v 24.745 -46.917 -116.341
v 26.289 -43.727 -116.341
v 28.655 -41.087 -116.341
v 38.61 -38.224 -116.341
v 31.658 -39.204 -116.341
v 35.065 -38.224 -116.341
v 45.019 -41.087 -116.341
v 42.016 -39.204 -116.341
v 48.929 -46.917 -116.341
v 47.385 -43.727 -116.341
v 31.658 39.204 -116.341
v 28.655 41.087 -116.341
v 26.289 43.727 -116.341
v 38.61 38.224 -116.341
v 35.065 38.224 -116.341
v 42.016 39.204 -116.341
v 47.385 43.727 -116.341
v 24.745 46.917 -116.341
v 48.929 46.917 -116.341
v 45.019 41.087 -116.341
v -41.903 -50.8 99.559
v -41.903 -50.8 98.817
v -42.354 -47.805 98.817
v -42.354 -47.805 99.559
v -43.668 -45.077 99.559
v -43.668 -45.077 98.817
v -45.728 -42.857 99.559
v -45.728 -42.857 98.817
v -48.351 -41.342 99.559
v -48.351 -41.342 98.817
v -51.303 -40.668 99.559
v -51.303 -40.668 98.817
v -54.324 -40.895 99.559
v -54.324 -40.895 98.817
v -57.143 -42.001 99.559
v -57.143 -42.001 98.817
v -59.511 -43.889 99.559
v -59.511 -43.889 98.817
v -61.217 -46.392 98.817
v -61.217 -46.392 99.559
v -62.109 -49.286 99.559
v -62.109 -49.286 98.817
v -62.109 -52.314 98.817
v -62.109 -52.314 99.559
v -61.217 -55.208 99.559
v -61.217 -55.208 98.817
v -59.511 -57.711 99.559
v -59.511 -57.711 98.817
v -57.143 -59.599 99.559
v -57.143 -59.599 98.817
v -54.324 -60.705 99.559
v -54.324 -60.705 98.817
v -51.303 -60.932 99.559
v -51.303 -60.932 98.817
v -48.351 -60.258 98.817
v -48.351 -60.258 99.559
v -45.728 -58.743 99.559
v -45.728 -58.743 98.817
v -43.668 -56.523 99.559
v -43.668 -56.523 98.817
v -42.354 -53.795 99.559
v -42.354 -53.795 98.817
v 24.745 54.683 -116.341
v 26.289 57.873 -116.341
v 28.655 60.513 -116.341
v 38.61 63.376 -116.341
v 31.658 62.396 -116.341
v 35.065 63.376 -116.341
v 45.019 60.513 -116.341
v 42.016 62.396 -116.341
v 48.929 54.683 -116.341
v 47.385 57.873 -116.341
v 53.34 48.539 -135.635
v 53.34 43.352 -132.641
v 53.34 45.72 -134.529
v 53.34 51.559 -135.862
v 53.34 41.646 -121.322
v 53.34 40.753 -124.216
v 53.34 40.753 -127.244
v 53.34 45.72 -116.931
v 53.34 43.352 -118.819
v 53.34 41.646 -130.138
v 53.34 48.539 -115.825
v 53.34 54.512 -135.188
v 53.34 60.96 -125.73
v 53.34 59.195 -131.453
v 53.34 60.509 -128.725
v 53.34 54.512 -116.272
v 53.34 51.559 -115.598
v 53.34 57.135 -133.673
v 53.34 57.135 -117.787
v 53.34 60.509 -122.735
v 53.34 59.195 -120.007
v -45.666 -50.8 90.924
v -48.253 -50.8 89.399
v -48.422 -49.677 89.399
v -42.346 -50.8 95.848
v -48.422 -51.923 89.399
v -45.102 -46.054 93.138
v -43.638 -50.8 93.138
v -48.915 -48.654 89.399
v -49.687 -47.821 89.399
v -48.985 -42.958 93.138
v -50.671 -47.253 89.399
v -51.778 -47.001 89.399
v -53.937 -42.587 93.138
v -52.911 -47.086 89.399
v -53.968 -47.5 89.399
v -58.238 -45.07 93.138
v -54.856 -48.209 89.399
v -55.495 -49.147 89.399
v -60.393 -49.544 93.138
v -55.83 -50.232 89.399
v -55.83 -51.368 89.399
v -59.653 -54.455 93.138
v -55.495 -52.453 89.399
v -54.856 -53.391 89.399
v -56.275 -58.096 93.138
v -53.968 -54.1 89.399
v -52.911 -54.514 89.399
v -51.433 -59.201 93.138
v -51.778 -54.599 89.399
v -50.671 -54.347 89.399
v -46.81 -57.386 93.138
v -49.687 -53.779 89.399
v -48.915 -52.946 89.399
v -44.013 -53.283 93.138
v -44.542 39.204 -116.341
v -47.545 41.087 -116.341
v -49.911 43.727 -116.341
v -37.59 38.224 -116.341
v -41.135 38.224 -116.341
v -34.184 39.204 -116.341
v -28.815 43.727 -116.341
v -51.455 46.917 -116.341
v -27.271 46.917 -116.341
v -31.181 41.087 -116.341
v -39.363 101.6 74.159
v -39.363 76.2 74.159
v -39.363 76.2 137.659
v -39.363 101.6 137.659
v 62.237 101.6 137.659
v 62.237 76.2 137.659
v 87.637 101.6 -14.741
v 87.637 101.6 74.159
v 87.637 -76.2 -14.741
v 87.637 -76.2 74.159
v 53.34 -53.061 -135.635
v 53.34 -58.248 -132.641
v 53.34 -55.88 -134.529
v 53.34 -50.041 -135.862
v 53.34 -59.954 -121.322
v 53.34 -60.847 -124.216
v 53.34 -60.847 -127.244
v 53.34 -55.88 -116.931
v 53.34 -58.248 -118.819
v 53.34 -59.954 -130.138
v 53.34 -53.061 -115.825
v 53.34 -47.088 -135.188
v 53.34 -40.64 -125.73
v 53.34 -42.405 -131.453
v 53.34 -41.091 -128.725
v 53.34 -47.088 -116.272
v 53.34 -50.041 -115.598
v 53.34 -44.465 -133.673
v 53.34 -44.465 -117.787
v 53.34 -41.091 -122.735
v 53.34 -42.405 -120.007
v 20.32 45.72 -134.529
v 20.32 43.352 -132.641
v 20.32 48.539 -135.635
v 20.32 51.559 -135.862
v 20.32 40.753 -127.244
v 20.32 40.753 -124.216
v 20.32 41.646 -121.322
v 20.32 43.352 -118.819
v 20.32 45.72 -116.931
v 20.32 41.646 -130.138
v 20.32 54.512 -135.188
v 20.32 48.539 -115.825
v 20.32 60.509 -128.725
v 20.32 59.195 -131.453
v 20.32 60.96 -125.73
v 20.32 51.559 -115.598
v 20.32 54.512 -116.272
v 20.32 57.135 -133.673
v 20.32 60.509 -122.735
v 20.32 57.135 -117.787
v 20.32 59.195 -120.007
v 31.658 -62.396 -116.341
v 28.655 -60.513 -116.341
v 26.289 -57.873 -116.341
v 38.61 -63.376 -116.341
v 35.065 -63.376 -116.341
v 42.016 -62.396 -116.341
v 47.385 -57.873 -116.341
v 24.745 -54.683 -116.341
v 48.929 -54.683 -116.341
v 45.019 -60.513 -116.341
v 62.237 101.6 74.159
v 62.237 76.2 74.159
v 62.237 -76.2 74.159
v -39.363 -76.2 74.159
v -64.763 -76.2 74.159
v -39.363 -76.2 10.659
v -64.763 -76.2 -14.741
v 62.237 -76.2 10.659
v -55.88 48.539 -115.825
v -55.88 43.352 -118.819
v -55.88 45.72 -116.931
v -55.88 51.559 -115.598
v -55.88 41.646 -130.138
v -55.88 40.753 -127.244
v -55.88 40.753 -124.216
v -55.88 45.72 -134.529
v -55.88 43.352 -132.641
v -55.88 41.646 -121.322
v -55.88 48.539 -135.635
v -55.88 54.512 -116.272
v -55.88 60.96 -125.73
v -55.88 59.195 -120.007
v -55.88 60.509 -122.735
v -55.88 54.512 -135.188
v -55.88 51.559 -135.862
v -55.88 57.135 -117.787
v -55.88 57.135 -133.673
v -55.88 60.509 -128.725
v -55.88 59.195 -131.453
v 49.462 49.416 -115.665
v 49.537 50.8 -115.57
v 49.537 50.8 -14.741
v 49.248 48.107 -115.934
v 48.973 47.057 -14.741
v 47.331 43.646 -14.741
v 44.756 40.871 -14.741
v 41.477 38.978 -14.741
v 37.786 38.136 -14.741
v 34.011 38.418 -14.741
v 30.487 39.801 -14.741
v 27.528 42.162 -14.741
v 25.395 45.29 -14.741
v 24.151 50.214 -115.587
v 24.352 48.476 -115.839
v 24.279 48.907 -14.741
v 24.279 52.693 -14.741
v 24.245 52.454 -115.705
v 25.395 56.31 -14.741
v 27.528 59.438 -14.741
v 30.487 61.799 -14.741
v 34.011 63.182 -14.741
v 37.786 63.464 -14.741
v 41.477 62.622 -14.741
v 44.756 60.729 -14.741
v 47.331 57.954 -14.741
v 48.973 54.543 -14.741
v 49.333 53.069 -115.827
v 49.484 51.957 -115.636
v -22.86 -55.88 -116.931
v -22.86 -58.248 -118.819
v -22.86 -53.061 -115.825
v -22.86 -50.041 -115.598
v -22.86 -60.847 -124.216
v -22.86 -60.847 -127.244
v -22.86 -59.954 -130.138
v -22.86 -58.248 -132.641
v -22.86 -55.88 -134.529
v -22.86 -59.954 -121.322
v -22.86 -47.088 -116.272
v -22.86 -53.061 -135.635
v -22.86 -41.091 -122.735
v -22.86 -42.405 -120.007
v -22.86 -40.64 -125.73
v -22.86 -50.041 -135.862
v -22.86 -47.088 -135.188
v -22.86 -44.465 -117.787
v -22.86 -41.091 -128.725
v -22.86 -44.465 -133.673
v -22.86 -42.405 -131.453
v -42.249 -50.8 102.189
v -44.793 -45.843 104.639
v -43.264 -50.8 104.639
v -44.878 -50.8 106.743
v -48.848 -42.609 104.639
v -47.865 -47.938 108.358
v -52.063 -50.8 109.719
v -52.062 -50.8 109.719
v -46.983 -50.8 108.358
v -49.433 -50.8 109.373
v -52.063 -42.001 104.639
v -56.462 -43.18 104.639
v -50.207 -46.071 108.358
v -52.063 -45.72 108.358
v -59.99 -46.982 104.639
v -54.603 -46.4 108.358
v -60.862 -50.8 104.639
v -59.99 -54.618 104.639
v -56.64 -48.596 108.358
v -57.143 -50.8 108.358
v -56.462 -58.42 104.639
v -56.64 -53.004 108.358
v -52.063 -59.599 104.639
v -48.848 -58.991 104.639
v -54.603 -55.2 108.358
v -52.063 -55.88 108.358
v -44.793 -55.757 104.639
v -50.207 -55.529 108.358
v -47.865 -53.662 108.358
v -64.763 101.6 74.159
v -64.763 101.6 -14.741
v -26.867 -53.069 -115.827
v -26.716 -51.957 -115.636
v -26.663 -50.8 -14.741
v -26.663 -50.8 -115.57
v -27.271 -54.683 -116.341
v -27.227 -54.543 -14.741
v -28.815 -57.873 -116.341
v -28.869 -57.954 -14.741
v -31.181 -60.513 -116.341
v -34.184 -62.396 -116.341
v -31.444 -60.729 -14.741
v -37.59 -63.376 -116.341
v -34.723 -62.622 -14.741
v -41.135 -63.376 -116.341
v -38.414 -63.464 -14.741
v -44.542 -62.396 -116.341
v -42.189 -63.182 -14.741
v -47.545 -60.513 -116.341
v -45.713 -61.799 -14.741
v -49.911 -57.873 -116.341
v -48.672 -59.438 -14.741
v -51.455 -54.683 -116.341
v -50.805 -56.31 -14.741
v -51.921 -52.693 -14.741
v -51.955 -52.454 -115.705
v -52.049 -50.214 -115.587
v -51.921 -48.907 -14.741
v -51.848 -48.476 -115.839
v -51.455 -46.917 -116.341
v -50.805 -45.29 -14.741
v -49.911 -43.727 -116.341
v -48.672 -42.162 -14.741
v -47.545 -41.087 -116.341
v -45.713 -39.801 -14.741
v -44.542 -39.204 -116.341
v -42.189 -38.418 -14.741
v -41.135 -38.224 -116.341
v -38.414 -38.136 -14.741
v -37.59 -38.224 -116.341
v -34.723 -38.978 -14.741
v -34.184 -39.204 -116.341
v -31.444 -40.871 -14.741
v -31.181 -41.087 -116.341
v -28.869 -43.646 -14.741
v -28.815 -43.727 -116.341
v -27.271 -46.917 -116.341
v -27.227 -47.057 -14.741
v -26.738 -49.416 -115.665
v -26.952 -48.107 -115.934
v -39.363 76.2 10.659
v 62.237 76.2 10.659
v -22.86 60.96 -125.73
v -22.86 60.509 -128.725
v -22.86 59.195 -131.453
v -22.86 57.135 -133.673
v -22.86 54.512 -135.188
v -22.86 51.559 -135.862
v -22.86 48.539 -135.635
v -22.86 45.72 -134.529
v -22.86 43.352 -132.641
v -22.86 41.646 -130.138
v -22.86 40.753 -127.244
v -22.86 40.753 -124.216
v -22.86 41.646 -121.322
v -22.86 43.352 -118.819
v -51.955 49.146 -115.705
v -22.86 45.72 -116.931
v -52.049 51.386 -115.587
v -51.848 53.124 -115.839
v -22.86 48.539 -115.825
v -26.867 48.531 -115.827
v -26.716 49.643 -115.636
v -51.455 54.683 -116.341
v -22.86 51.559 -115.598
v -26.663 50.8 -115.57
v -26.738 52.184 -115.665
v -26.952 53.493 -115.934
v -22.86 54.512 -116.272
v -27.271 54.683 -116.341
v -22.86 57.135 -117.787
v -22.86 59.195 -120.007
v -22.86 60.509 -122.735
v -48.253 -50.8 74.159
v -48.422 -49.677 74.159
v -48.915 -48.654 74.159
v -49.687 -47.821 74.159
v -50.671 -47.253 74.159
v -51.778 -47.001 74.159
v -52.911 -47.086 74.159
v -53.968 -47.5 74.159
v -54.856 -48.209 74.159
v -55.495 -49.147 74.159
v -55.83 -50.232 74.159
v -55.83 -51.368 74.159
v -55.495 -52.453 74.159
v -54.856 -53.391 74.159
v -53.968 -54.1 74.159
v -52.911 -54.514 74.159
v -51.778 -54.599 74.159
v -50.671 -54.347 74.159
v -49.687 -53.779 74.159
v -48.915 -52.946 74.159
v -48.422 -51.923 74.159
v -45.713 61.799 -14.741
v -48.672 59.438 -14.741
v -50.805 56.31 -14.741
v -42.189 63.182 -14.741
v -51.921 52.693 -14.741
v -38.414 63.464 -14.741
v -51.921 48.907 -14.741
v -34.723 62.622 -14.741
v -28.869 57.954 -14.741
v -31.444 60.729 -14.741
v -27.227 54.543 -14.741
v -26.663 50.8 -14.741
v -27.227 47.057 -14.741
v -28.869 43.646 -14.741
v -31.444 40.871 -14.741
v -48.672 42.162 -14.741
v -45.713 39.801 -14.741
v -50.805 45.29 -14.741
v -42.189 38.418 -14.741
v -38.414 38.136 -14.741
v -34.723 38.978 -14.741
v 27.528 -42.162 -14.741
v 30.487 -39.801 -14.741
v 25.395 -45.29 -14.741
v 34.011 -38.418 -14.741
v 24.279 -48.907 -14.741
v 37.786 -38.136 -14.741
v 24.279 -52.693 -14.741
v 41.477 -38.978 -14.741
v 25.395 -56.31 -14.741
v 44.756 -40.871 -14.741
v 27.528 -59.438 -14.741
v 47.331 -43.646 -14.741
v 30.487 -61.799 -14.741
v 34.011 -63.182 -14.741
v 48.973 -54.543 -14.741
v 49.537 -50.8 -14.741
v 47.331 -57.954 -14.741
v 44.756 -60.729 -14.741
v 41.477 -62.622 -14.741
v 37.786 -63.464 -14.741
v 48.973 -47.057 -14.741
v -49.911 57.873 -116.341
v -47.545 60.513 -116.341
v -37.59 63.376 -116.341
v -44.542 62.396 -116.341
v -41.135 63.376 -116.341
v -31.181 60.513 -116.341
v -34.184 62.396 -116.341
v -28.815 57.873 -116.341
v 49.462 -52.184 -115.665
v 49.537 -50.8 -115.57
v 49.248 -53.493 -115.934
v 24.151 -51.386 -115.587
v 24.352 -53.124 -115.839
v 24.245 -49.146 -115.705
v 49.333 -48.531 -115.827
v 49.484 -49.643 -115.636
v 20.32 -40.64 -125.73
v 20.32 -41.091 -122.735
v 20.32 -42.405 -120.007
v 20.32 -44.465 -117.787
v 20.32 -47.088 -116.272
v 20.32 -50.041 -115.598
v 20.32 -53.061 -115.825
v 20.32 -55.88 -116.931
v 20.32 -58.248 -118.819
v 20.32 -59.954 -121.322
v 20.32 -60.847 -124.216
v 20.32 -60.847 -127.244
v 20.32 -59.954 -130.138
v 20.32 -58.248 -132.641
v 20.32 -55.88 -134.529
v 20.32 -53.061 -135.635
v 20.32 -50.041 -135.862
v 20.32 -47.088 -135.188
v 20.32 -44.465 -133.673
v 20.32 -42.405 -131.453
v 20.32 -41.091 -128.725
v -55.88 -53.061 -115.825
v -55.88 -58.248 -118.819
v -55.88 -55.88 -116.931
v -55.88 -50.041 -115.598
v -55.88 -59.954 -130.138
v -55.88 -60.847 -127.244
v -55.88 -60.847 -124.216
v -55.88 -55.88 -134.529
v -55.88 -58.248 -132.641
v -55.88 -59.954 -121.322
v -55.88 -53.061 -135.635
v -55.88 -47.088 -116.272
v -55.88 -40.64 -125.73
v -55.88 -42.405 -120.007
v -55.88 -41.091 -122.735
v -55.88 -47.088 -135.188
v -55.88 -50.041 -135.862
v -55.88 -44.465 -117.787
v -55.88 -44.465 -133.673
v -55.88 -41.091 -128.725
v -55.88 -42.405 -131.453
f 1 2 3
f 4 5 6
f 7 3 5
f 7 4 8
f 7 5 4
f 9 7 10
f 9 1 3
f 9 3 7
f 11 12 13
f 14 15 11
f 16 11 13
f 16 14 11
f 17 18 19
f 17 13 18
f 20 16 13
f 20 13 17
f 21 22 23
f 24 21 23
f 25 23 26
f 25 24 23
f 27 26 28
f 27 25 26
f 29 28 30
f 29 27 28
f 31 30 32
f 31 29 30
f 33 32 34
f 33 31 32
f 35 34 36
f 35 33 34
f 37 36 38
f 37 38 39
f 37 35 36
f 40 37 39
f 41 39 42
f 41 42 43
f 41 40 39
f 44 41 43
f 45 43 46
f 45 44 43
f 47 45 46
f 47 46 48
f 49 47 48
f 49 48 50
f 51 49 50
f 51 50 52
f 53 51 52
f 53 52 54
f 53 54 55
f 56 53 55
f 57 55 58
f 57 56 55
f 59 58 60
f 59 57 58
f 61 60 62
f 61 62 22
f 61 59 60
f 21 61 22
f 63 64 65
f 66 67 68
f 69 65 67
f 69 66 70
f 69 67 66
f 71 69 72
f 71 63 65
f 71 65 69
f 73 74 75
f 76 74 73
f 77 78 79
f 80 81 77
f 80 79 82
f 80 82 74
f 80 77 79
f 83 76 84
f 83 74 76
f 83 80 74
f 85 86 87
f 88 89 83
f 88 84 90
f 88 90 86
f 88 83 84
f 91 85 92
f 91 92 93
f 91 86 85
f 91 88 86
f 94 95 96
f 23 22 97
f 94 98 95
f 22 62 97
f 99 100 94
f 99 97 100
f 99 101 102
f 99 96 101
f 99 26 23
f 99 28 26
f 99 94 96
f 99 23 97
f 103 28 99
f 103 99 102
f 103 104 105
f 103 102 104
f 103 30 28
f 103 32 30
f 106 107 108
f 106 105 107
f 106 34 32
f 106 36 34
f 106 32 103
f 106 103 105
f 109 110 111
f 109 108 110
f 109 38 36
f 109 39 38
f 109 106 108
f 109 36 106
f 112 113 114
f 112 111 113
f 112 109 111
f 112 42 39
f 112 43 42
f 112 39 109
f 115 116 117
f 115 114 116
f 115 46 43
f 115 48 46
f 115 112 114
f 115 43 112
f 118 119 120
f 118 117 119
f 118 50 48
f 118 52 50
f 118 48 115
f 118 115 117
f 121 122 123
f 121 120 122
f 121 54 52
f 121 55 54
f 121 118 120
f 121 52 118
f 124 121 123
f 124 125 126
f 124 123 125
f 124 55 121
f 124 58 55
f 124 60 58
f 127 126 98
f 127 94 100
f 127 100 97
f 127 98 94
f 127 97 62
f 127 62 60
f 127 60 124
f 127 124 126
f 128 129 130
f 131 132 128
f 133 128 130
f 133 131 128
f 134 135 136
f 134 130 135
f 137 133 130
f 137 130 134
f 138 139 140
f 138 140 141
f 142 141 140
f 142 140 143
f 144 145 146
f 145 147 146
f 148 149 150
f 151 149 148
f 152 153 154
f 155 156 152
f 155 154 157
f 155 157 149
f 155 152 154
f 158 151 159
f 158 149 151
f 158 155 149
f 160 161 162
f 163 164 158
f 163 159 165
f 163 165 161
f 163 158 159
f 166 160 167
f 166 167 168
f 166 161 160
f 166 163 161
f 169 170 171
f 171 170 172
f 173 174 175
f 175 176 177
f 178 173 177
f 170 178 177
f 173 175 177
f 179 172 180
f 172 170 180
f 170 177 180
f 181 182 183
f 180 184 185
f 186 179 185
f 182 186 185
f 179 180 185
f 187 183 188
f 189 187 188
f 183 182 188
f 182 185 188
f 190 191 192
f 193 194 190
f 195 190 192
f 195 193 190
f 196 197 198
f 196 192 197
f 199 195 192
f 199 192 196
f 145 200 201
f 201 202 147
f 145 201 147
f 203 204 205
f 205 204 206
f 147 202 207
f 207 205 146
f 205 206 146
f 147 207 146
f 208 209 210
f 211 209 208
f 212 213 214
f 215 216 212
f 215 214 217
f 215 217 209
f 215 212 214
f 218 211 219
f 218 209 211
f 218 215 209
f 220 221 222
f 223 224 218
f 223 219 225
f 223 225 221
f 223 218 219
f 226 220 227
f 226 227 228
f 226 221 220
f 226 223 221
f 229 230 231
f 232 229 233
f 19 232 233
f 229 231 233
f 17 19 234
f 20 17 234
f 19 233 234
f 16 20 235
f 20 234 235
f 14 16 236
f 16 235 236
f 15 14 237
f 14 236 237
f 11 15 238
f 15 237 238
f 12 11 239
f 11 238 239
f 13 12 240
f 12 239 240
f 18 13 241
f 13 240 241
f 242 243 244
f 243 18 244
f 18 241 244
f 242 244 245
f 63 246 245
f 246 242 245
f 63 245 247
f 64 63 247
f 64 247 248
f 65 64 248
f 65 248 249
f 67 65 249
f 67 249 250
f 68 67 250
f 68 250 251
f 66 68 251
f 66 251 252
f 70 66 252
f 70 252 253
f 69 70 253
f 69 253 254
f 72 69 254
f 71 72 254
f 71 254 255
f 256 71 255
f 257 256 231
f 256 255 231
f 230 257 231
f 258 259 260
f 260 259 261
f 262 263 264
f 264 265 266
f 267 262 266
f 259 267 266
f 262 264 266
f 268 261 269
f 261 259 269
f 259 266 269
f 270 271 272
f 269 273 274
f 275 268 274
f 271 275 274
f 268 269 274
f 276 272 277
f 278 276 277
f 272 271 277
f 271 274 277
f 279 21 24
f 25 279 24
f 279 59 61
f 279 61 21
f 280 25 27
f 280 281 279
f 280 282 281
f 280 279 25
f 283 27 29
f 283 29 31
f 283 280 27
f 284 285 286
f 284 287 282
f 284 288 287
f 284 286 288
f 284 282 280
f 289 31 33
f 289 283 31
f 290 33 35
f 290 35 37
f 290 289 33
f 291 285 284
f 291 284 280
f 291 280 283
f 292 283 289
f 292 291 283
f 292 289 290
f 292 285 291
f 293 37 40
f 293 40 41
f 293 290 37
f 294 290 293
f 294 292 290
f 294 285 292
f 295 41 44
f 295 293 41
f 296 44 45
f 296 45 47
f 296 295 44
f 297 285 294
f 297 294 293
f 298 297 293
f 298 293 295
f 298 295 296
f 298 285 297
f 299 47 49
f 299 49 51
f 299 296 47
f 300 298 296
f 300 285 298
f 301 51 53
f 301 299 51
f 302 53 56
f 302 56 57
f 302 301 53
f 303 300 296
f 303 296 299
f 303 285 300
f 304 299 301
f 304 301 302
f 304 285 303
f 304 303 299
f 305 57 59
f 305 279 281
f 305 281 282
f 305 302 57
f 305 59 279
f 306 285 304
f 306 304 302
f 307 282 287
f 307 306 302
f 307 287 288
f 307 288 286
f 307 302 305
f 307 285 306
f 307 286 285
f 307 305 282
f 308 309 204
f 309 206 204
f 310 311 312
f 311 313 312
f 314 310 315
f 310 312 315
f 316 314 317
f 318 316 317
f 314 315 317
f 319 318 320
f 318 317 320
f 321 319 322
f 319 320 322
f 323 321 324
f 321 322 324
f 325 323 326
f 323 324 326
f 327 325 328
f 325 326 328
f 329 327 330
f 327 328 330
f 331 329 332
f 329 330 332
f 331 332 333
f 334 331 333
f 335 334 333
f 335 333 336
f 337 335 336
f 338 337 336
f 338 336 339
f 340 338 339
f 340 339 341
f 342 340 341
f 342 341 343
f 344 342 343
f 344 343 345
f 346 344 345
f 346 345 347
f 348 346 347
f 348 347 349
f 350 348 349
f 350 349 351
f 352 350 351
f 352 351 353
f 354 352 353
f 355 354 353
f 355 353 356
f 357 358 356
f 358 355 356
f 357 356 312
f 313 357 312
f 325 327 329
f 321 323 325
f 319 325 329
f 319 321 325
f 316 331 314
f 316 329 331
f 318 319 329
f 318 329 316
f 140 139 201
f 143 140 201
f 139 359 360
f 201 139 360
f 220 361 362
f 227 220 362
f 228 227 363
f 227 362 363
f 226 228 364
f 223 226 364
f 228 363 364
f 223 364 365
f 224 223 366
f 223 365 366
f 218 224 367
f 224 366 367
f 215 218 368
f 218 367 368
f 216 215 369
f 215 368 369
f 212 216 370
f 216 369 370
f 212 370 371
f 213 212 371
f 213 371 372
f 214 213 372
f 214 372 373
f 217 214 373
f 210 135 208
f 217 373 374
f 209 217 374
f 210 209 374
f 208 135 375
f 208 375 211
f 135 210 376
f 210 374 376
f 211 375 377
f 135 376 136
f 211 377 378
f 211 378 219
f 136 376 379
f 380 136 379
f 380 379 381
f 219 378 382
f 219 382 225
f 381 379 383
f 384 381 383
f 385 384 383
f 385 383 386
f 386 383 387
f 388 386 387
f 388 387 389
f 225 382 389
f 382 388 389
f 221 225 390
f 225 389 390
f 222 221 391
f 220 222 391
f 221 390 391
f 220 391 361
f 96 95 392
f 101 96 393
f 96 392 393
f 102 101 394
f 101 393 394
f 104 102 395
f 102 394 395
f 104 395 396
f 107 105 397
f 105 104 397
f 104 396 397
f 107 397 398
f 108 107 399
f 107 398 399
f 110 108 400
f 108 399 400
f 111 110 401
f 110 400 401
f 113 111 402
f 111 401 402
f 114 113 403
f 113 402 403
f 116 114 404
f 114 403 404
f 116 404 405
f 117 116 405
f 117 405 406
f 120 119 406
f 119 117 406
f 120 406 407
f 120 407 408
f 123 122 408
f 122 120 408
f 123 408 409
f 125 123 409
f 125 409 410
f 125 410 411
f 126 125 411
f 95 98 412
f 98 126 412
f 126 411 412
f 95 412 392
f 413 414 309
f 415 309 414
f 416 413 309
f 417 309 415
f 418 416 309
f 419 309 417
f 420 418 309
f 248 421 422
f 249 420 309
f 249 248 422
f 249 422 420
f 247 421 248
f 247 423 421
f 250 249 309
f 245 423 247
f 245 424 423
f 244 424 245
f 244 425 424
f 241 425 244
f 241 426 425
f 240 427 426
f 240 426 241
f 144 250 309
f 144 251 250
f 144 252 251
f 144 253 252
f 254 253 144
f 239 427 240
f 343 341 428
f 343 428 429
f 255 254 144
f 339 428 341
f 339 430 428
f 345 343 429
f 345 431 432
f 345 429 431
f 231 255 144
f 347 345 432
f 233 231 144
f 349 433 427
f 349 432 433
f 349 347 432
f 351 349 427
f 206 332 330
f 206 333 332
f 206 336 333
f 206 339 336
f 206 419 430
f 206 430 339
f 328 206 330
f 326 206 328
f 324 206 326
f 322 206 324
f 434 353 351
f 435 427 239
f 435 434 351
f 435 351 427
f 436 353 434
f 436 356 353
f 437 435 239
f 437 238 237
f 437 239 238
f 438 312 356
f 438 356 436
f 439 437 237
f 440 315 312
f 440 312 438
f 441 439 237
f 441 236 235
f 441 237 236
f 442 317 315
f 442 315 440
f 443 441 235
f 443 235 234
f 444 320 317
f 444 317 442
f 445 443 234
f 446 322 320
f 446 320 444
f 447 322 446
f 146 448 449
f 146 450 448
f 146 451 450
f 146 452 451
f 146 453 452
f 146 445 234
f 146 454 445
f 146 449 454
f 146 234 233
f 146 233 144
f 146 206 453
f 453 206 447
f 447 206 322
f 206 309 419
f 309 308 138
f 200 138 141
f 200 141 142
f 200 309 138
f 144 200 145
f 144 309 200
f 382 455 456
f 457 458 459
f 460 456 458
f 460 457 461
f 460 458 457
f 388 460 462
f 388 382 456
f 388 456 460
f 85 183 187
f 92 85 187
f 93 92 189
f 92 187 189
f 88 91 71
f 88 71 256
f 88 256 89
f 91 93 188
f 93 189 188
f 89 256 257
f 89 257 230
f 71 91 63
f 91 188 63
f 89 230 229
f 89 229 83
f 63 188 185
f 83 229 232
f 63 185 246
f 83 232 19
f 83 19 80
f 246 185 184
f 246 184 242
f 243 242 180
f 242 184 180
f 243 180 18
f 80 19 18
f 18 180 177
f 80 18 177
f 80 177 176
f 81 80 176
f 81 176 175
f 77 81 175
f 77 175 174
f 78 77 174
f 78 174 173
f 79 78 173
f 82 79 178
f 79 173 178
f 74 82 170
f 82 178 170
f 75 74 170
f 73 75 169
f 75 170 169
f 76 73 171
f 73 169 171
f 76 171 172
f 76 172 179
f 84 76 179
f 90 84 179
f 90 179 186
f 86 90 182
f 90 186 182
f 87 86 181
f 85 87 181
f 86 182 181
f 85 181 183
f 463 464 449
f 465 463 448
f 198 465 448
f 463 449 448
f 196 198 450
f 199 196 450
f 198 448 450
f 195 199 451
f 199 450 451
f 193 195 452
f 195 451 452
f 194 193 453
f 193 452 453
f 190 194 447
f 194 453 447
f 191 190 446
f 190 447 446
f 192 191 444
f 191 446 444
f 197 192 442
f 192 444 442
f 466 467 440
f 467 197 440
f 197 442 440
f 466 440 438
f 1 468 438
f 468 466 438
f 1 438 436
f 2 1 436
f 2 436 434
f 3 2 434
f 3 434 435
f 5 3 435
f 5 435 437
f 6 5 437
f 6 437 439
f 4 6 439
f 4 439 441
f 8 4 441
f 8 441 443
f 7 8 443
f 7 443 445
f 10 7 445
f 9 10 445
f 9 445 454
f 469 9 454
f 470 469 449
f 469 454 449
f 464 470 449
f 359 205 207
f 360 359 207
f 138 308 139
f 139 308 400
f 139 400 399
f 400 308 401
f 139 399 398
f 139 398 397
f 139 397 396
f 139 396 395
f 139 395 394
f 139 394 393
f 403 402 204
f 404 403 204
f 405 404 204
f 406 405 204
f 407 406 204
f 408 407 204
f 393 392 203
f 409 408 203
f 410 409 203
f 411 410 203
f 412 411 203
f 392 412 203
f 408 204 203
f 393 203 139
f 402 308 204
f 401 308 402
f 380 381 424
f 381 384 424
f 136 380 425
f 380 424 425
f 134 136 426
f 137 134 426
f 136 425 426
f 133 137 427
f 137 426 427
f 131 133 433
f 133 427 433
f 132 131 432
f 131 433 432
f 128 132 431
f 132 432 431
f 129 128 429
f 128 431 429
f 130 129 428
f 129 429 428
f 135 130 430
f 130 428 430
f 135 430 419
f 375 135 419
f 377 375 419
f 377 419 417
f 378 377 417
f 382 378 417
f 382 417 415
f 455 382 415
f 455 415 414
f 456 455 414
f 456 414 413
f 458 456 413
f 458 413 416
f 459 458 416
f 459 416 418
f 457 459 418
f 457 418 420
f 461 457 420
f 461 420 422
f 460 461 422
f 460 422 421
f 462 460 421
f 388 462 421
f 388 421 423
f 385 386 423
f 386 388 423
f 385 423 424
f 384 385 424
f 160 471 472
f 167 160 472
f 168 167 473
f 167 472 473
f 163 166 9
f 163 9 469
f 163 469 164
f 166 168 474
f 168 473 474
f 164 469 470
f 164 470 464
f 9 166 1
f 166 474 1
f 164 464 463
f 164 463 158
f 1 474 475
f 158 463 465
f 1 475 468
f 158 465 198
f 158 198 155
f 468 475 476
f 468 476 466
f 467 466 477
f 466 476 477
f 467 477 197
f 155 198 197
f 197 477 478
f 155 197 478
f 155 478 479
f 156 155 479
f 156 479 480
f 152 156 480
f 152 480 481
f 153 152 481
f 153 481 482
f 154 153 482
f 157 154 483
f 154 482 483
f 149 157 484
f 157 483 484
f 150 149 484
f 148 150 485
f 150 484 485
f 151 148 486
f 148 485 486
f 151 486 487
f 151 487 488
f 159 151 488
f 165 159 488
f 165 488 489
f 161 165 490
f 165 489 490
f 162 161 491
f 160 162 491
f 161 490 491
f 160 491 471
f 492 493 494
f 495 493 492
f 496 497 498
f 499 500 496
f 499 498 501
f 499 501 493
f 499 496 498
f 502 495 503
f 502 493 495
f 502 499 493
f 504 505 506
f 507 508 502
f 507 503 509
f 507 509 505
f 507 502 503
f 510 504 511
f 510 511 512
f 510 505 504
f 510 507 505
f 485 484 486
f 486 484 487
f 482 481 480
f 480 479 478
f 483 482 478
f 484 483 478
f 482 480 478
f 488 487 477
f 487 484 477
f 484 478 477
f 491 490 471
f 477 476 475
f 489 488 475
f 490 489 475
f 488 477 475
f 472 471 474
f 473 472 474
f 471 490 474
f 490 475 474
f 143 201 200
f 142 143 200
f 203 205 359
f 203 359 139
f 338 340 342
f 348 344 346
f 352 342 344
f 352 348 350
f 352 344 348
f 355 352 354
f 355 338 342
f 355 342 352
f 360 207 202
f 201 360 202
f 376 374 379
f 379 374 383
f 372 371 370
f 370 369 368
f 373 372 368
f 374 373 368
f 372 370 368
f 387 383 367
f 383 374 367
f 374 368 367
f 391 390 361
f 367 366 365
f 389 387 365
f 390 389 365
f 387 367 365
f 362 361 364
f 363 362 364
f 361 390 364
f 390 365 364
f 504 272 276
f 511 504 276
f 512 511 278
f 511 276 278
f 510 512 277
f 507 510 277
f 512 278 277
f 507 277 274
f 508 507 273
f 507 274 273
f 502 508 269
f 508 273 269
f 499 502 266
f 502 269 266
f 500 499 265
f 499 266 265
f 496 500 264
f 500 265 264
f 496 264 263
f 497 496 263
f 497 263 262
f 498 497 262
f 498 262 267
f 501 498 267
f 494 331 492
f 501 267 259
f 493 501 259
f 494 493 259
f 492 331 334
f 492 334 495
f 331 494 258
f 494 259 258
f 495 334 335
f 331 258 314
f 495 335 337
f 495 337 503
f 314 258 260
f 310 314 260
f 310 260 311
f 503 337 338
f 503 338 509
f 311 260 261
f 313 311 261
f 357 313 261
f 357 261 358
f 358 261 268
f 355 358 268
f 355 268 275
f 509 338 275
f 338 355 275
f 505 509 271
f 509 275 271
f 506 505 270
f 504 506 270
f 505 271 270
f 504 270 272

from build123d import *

# Parameters (mm, degrees)
F0_W      = 127
F0_H      = 25.4
F1_DEPTH  = 76.2
F2_R      = 12.7
F3_DEPTH  = 101.6
F5_START  = 20.32
F4_R      = 10.16
F5_DEPTH  = 33.02
F6_START  = 43.18
F5_FACE_R = 10.16
F6_DEPTH  = 33.02
F7_DEPTH  = 25.4
F8_W      = 25.4
F8_H      = 152.4
F9_DEPTH  = 63.5
F10_DEPTH = 25.4
F11_W     = 101.6
F11_H     = 25.4
F12_DEPTH = 127
F13_R     = 3.81
F14_DEPTH = 25.4
F15_R     = 10.16
F16_DEPTH = 10.16


# Not quite as in the source:
# - a fillet or chamfer that OpenCascade refuses, or shapes differently, is made with other operations: its cross-section is extruded or revolved along the edge and cut away or added


with BuildPart() as f1:
    # F0 (on Front) → F1 (new body, symmetric)
    with BuildSketch(Plane.XZ):
        with Locations((-1.2627113611, -2.0410835827)):
            Rectangle(F0_W, F0_H)
    extrude(amount=F1_DEPTH, both=True)

    # F2 (on face) → F3 (join)
    with BuildSketch(Plane(origin=(0, 0, -14.7410835827), x_dir=(1, 0, 0), z_dir=(0, 0, -1))):
        with Locations((-39.3627113611, 50.8)):
            Circle(F2_R)
        with Locations((36.8372886389, 50.8)):
            Circle(F2_R)
        with Locations((36.8372886389, -50.8)):
            Circle(F2_R)
        with Locations((-39.3627113611, -50.8)):
            Circle(F2_R)
    extrude(amount=F3_DEPTH)

    # F4 (on Right) → F5 (join)
    with BuildSketch(Plane.YZ.offset(F5_START)):
        with Locations((-50.8, -125.73)):
            Circle(F4_R)
        with Locations((50.8, -125.73)):
            Circle(F4_R)
    extrude(amount=F5_DEPTH)

    # F5_face (on face) → F6 (join)
    with BuildSketch(Plane(origin=(20.32, 50.8, -125.73), x_dir=(0, 1, 0), z_dir=(-1, 0, 0)).offset(F6_START)):
        Circle(F5_FACE_R)
        with Locations((-101.6, 0)):
            Circle(F5_FACE_R)
    extrude(amount=F6_DEPTH)

    # F7 (add): a face of the model
    f7_faces = [f1.faces().sort_by_distance(p)[0] for p in [
        (62.2372886389, 0, -2.0410835827),
    ]]
    extrude(f7_faces, amount=F7_DEPTH)

    # F8 (on face) → F9 (join)
    with BuildSketch(Plane.XY.offset(10.6589164173)):
        with Locations((74.9372886389, 0)):
            Rectangle(F8_W, F8_H)
        with Locations((-52.0627113611, 0)):
            Rectangle(F8_W, F8_H)
    extrude(amount=F9_DEPTH)

    # F10 (add): a face of the model
    f10_faces = [f1.faces().sort_by_distance(p)[0] for p in [
        (11.4372886389, 76.2, 8.8945760307),
    ]]
    extrude(f10_faces, amount=F10_DEPTH)

    # F11 (on face) → F12 (join)
    with BuildSketch(Plane.XY.offset(10.6589164173)):
        with Locations((11.4372886389, 88.9)):
            Rectangle(F11_W, F11_H)
    extrude(amount=F12_DEPTH)

    # F13 (on face) → F14 (join)
    with BuildSketch(Plane.XY.offset(74.1589164173)):
        with Locations((-52.0627113611, -50.8)):
            Circle(F13_R)
    extrude(amount=F14_DEPTH)

    # F15 (on face) → F16 (join, symmetric)
    with BuildSketch(Plane.XY.offset(99.5589164173)):
        with Locations((-52.0627113611, -50.8)):
            Circle(F15_R)
    extrude(amount=F16_DEPTH, both=True)

    # F17: fillet of radius 10.159746 on 2 edges, made by hand

    # F17_s1 → F17_t2 (revolve, cut)
    with BuildSketch(Plane.XZ.offset(50.8)):
        with BuildLine():
            ThreePointArc((-41.9027113611, 99.5591704173), (-44.8784320693, 106.7431957091), (-52.0624573611, 109.7189164173))
            Line((-52.0624573611, 109.7189164173), (-41.9027113611, 109.7189164173))
            Line((-41.9027113611, 109.7189164173), (-41.9027113611, 99.5591704173))
        make_face()
    revolve(axis=Axis((-52.0627113611, -50.8, 109.7189164173), (0, 0, 1)), mode=Mode.SUBTRACT)

    # F17_s3 → F17_t4 (revolve, cut)
    with BuildSketch(Plane.XZ.offset(50.8)):
        with BuildLine():
            ThreePointArc((-48.2527113611, 89.3989164173), (-43.6384888643, 93.1377755804), (-41.9027113611, 98.8173172476))
            Line((-41.9027113611, 98.8173172476), (-41.9027113611, 89.3989164173))
            Line((-41.9027113611, 89.3989164173), (-48.2527113611, 89.3989164173))
        make_face()
    revolve(axis=Axis((-52.0627113611, -50.8, 89.3989164173), (0, 0, 1)), mode=Mode.SUBTRACT)


solid = f1.part
